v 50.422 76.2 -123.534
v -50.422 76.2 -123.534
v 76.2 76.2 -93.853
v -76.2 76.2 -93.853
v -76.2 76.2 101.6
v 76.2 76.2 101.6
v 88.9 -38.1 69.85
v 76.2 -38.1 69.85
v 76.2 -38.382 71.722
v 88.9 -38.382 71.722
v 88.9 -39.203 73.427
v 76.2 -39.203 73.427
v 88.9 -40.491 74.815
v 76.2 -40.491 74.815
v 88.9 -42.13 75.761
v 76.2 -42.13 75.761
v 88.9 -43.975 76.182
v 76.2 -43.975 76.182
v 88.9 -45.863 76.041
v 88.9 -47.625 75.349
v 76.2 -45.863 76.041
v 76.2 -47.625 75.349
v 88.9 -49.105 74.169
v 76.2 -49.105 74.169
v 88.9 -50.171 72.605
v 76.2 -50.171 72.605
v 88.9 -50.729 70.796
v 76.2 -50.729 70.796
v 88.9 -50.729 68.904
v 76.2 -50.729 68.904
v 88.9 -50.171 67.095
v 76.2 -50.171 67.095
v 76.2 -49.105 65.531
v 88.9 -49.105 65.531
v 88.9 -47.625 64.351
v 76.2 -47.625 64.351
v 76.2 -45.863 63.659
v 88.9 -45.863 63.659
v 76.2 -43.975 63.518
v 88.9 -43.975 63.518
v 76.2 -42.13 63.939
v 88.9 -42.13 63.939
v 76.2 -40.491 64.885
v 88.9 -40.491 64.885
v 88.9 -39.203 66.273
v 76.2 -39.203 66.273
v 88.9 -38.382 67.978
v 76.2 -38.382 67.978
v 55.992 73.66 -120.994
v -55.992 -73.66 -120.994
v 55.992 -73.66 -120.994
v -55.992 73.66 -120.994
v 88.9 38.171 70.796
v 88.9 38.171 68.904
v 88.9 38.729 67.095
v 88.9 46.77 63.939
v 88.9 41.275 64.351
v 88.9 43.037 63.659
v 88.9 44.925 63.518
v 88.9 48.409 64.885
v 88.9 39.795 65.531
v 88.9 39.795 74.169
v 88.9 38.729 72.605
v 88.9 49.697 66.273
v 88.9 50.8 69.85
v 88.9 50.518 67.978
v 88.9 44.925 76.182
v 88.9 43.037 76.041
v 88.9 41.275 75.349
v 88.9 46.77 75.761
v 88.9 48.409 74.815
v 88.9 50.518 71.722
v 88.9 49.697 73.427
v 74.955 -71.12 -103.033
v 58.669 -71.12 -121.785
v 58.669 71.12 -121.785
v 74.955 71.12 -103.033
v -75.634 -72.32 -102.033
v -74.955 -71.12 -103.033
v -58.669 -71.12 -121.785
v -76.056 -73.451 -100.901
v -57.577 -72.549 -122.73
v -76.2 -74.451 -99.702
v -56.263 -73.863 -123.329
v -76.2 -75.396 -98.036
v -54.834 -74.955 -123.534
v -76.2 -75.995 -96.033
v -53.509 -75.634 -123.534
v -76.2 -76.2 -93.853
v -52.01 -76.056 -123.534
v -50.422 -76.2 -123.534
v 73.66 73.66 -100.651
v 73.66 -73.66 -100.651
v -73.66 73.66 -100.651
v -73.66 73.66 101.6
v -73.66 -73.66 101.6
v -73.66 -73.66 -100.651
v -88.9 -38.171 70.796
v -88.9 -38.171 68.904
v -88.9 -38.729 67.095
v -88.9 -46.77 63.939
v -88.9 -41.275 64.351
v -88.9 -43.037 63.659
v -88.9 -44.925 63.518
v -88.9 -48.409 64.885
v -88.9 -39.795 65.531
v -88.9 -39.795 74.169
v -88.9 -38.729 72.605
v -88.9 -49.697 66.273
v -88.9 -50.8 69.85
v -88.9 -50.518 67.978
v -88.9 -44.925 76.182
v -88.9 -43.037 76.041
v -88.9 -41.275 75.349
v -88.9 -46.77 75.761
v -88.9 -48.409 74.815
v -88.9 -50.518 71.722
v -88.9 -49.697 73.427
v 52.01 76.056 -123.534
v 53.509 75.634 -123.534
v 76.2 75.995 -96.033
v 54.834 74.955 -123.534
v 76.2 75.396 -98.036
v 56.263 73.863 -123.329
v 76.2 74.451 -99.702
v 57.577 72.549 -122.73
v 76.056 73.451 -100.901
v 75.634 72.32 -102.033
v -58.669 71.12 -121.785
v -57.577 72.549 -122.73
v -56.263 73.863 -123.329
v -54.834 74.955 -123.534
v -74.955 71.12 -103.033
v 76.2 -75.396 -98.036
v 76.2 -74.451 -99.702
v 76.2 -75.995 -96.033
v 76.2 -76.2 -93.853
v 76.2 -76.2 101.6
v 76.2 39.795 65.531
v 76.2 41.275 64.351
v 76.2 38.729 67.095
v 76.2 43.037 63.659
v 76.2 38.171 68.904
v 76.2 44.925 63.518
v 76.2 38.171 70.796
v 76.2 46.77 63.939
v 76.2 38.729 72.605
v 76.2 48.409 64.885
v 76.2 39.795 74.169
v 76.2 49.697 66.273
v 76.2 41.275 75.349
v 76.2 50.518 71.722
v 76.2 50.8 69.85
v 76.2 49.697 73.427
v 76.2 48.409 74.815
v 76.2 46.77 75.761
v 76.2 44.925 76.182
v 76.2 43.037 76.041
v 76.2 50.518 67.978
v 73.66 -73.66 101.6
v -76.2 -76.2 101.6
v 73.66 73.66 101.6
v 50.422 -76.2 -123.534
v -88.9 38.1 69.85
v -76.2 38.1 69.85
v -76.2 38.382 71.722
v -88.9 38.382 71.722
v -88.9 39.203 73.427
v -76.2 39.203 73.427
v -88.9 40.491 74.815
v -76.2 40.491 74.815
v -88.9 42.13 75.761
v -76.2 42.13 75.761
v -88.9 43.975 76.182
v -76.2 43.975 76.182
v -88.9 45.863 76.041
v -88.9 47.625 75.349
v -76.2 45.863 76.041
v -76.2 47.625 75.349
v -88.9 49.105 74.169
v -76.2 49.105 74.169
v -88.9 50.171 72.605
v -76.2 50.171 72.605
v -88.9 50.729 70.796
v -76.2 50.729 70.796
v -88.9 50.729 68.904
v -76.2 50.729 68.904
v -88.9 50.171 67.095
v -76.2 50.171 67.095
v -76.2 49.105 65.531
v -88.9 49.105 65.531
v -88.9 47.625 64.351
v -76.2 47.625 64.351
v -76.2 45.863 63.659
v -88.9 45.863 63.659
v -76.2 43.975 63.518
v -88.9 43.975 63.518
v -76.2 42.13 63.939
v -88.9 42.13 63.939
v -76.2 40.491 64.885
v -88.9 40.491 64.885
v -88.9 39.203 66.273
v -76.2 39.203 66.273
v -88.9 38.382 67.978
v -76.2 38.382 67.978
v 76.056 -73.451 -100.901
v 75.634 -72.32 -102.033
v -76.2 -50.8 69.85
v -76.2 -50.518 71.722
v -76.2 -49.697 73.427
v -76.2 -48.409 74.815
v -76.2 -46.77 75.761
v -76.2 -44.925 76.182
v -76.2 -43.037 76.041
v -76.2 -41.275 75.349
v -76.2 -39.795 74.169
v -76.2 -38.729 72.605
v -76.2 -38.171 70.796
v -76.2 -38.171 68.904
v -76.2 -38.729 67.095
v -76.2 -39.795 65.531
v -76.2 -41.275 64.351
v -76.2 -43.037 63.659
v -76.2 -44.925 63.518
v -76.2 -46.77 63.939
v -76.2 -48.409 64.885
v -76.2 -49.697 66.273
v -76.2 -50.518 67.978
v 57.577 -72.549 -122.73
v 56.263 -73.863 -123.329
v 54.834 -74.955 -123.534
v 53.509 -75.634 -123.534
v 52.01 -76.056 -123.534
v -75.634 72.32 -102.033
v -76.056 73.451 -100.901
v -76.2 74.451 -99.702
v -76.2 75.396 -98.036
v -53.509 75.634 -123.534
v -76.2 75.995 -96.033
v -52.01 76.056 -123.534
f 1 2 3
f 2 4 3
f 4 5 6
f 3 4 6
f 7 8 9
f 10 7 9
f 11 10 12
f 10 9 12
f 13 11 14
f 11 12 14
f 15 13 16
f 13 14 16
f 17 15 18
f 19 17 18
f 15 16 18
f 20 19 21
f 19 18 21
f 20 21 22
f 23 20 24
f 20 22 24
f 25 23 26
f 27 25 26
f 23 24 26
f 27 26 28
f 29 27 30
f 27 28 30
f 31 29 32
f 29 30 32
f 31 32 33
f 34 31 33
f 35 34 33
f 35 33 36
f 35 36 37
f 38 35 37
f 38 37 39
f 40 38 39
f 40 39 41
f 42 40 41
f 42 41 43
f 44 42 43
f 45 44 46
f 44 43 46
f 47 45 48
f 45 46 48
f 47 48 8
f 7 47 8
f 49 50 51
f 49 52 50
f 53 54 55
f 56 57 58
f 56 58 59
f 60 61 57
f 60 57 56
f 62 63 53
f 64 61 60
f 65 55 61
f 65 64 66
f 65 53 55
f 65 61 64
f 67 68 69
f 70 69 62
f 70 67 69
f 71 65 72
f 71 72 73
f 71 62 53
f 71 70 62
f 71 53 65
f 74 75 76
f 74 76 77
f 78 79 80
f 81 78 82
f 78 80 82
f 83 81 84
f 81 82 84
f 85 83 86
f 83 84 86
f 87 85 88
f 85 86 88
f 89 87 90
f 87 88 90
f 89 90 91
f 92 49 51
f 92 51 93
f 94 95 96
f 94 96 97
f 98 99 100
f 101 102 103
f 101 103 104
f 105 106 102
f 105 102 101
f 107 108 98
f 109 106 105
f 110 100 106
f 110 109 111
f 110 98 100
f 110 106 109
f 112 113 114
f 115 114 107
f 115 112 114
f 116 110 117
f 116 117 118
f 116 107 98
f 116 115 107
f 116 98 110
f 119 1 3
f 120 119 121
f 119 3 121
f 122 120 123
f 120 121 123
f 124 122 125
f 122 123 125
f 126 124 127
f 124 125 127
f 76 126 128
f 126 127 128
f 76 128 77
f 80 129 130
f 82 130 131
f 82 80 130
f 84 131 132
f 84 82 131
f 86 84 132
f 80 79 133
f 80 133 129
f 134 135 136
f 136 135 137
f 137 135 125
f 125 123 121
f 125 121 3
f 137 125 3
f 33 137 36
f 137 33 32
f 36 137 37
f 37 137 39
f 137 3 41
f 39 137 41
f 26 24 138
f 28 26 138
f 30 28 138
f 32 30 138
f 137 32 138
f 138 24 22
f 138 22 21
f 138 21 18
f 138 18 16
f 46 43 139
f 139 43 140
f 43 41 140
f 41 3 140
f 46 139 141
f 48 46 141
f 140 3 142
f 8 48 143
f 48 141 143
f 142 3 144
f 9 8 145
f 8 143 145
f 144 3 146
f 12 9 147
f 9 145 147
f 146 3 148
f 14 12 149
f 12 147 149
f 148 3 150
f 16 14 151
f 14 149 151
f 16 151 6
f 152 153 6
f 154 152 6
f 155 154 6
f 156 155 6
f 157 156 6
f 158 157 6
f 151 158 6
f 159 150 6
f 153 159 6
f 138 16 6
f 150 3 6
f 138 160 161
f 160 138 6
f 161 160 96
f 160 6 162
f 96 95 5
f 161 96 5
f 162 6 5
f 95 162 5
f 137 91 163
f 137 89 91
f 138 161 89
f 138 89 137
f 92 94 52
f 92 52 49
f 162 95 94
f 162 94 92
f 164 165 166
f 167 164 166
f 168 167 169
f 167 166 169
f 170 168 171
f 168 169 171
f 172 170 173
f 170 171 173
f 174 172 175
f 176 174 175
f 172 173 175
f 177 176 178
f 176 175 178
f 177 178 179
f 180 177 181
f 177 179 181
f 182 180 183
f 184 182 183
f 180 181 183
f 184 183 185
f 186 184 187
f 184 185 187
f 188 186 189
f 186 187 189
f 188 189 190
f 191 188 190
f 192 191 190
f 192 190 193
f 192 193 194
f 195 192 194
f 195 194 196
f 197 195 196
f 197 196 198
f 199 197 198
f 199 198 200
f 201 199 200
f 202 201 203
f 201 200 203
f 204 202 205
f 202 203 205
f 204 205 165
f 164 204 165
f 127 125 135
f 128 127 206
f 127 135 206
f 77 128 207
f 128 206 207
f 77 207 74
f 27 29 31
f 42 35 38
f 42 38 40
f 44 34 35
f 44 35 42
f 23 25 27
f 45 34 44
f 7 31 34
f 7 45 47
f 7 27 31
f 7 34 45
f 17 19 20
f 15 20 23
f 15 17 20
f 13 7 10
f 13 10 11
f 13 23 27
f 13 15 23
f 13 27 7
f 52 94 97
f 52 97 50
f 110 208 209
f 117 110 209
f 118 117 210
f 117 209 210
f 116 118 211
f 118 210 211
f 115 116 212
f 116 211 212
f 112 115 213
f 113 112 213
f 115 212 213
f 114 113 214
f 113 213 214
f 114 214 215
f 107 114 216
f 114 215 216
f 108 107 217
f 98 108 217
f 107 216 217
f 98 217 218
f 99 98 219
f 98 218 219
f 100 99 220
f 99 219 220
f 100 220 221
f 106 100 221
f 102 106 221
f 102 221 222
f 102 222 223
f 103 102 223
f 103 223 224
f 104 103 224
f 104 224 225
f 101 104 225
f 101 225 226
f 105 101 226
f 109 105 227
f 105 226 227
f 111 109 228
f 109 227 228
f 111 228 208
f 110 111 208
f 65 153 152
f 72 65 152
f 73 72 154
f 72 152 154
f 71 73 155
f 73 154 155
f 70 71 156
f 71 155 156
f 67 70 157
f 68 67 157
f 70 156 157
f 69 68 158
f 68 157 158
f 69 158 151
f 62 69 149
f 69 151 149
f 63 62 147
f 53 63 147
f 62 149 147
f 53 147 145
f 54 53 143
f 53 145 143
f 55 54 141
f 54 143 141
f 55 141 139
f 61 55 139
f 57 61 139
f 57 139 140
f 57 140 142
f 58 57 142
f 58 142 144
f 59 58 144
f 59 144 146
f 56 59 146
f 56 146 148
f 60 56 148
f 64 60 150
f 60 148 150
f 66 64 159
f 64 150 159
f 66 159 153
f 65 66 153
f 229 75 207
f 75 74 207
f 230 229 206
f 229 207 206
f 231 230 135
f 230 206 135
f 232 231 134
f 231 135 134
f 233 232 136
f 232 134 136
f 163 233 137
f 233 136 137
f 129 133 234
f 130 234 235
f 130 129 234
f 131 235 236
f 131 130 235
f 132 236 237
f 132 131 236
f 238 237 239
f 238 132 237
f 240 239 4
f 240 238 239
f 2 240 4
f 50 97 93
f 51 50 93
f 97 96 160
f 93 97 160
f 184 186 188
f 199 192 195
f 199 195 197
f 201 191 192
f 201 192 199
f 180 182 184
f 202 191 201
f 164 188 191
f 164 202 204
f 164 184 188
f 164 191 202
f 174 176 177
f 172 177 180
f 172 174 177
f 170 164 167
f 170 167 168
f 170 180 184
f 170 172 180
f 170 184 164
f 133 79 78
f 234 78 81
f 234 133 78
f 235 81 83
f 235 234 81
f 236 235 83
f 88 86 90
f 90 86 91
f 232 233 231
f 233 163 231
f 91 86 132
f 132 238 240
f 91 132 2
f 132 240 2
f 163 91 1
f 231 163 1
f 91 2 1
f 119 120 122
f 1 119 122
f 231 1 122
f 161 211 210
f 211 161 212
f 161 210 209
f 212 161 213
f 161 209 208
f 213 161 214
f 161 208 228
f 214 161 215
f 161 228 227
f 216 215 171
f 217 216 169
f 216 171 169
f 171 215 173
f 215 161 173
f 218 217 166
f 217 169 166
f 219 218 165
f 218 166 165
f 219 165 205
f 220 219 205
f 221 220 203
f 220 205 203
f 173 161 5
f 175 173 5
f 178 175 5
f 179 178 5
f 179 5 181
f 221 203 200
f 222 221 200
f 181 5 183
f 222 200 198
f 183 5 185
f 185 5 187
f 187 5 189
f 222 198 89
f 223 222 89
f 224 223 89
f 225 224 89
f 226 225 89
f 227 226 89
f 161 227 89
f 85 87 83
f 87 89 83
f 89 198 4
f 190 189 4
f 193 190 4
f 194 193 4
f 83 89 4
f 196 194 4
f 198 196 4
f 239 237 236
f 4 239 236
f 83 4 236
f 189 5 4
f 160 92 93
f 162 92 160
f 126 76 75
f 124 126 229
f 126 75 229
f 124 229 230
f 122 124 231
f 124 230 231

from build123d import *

# Parameters (mm, degrees)
F0_W          = 114.3
F0_H          = 21.9340088606
F1_DEPTH      = 76.2
F1_DEPTH_BACK = 76.2
F2_T          = -2.54
F3_R          = 5.08
F4_R          = 6.35
F5_DEPTH      = 12.7
F6_R          = 6.35
F7_DEPTH      = 12.7


with BuildPart() as f1:
    # F0 (on Front) → F1 (new body, two sides)
    with BuildSketch(Plane.XZ) as f1_sk:
        Polygon((-57.15, -101.6), (-76.2, -101.6), (-57.15, -123.5340088606), align=None)
        Polygon((76.2, -101.6), (57.15, -101.6), (57.15, -123.5340088606), align=None)
        Polygon((-76.2, 101.6), (-76.2, -101.6), (-57.15, -101.6), (-57.15, -79.6659911394), (57.15, -79.6659911394), (57.15, -101.6), (76.2, -101.6), (76.2, 101.6), align=None)
        with Locations((0, -90.6329955697)):
            Rectangle(F0_W, F0_H)
        with Locations((0, -112.5670044303)):
            Rectangle(F0_W, F0_H)
    extrude(amount=-F1_DEPTH)
    extrude(f1_sk.sketch, amount=F1_DEPTH_BACK)

    # F2
    f2_openings = [f1.faces().sort_by_distance(p)[0] for p in [
        (0, 0, 101.6),
    ]]
    offset(amount=F2_T, openings=f2_openings)

    # F3
    f3_edges = [f1.edges().sort_by_distance(p)[0] for p in [
        (-66.675, 76.2, -112.567004),
        (-57.15, 0, -123.534009),
        (-66.675, -76.2, -112.567004),
        (-76.2, 0, -101.6),
        (57.15, 0, -123.534009),
        (66.675, 76.2, -112.567004),
        (76.2, 0, -101.6),
        (66.675, -76.2, -112.567004),
    ]]
    fillet(f3_edges, radius=F3_R)

    # F4 (on face) → F5 (join)
    with BuildSketch(Plane(origin=(-76.2, 0, 0), x_dir=(0, -1, 0), z_dir=(-1, 0, 0))):
        with Locations((-44.45, 69.85)):
            Circle(F4_R)
        with Locations((44.45, 69.85)):
            Circle(F4_R)
    extrude(amount=F5_DEPTH)

    # F6 (on face) → F7 (join)
    with BuildSketch(Plane.YZ.offset(76.2)):
        with Locations((-44.45, 69.85)):
            Circle(F6_R)
        with Locations((44.45, 69.85)):
            Circle(F6_R)
    extrude(amount=F7_DEPTH)


solid = f1.part
